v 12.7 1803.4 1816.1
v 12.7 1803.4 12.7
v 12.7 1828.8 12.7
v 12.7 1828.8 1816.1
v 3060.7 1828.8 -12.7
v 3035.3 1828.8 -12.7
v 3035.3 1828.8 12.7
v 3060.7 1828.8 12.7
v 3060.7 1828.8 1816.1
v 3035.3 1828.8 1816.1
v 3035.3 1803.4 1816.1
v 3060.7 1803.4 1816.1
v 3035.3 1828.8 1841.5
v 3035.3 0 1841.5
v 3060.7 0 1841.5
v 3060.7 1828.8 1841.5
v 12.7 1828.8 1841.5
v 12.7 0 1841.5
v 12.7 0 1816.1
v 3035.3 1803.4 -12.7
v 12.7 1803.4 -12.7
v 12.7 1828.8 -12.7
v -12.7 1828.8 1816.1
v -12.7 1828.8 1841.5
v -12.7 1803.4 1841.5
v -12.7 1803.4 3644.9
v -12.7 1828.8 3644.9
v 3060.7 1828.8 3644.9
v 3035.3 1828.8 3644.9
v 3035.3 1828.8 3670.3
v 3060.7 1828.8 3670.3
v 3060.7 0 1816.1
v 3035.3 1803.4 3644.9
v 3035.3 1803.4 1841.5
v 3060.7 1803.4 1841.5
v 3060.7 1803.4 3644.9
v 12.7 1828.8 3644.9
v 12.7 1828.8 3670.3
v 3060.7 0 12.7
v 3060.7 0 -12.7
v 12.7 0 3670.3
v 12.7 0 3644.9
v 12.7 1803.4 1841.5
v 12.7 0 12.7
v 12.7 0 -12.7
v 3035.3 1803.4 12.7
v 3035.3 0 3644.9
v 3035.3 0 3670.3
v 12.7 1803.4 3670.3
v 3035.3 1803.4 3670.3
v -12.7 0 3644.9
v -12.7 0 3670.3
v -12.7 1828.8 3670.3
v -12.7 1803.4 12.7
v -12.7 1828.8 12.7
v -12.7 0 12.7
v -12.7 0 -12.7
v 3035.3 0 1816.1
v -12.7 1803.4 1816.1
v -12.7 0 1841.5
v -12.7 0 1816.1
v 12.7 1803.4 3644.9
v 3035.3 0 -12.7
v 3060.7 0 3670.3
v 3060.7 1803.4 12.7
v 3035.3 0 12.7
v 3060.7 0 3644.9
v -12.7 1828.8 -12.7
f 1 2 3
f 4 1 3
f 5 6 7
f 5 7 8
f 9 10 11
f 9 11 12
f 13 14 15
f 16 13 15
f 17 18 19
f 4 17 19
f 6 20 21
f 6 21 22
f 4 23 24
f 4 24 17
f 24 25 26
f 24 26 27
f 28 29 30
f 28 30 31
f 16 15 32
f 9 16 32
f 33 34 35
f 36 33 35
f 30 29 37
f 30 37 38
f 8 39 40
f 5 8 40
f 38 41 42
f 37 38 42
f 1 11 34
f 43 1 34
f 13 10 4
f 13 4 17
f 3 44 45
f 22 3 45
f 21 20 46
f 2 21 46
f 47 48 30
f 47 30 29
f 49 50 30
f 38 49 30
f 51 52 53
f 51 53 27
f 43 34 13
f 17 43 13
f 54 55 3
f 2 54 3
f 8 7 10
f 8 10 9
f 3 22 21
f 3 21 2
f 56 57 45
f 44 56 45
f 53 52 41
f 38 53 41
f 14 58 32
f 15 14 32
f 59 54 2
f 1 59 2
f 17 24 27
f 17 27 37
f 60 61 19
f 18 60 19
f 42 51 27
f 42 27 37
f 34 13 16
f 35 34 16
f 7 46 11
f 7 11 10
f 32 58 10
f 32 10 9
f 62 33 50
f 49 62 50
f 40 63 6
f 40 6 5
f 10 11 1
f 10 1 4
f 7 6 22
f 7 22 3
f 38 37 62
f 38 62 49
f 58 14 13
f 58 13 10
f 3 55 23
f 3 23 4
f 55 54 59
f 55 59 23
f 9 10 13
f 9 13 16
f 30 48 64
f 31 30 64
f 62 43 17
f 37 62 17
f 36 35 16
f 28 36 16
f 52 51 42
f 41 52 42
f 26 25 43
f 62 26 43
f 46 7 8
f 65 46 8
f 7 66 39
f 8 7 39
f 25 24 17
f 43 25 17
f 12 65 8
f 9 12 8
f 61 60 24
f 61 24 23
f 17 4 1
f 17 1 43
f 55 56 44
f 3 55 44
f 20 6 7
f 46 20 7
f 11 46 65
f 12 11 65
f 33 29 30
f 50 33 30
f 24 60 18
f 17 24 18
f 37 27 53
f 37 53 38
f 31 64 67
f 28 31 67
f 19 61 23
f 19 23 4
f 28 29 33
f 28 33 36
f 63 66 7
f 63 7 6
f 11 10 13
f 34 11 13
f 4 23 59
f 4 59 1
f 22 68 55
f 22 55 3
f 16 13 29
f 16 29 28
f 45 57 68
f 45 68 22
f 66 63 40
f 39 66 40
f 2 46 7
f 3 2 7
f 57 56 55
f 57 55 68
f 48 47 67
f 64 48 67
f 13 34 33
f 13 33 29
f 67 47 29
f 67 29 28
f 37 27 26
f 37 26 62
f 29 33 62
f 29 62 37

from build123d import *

# Parameters (mm, degrees)
SKETCH1_W             = 25.4
SKETCH1_H             = 25.4
BOSS_EXTRUDE1_DEPTH   = 1828.8
BOSS_EXTRUDE1_2_DEPTH = 1828.8
BOSS_EXTRUDE1_3_DEPTH = 1828.8
BOSS_EXTRUDE1_4_DEPTH = 1828.8
BOSS_EXTRUDE1_5_DEPTH = 1828.8
BOSS_EXTRUDE1_6_DEPTH = 1828.8
SKETCH2_W             = 25.4
SKETCH2_H             = 25.4
BOSS_EXTRUDE2_DEPTH   = 1803.4
BOSS_EXTRUDE2_2_DEPTH = 1803.4
SKETCH3_W             = 25.4
SKETCH3_H             = 25.4
BOSS_EXTRUDE3_DEPTH   = 1803.4
BOSS_EXTRUDE3_2_DEPTH = 1803.4
SKETCH4_W             = 25.4
SKETCH4_H             = 25.4
BOSS_EXTRUDE4_DEPTH   = 3022.6
BOSS_EXTRUDE4_2_DEPTH = 3022.6
BOSS_EXTRUDE4_3_DEPTH = 3022.6


with BuildPart() as part:
    # Sketch1 → Boss-Extrude1 (new body)
    with BuildSketch(Plane(origin=(0, 0, 0), x_dir=(1, 0, 0), z_dir=(0, 1, 0))):
        Rectangle(SKETCH1_W, SKETCH1_H)
    extrude(amount=BOSS_EXTRUDE1_DEPTH)


with BuildPart() as body_2:
    # Sketch1 → Boss-Extrude1 2 (new body)
    with BuildSketch(Plane(origin=(0, 0, 0), x_dir=(1, 0, 0), z_dir=(0, 1, 0))):
        with Locations((3048, -1828.8)):
            Rectangle(SKETCH1_W, SKETCH1_H)
    extrude(amount=BOSS_EXTRUDE1_2_DEPTH)


with BuildPart() as body_3:
    # Sketch1 → Boss-Extrude1 3 (new body)
    with BuildSketch(Plane(origin=(0, 0, 0), x_dir=(1, 0, 0), z_dir=(0, 1, 0))):
        with Locations((0, -1828.8)):
            Rectangle(SKETCH1_W, SKETCH1_H)
    extrude(amount=BOSS_EXTRUDE1_3_DEPTH)


with BuildPart() as body_4:
    # Sketch1 → Boss-Extrude1 4 (new body)
    with BuildSketch(Plane(origin=(0, 0, 0), x_dir=(1, 0, 0), z_dir=(0, 1, 0))):
        with Locations((0, -3657.6)):
            Rectangle(SKETCH1_W, SKETCH1_H)
    extrude(amount=BOSS_EXTRUDE1_4_DEPTH)


with BuildPart() as body_5:
    # Sketch1 → Boss-Extrude1 5 (new body)
    with BuildSketch(Plane(origin=(0, 0, 0), x_dir=(1, 0, 0), z_dir=(0, 1, 0))):
        with Locations((3048, -3657.6)):
            Rectangle(SKETCH1_W, SKETCH1_H)
    extrude(amount=BOSS_EXTRUDE1_5_DEPTH)


with BuildPart() as body_6:
    # Sketch1 → Boss-Extrude1 6 (new body)
    with BuildSketch(Plane(origin=(0, 0, 0), x_dir=(1, 0, 0), z_dir=(0, 1, 0))):
        with Locations((3048, 0)):
            Rectangle(SKETCH1_W, SKETCH1_H)
    extrude(amount=BOSS_EXTRUDE1_6_DEPTH)


with BuildPart() as body_7:
    # Sketch2 → Boss-Extrude2 (new body)
    with BuildSketch(Plane.XY.offset(12.7)):
        with Locations((0, 1816.1)):
            Rectangle(SKETCH2_W, SKETCH2_H)
    extrude(amount=BOSS_EXTRUDE2_DEPTH)


with BuildPart() as body_8:
    # Sketch2 → Boss-Extrude2 2 (new body)
    with BuildSketch(Plane.XY.offset(12.7)):
        with Locations((3048, 1816.1)):
            Rectangle(SKETCH2_W, SKETCH2_H)
    extrude(amount=BOSS_EXTRUDE2_2_DEPTH)


with BuildPart() as body_9:
    # Sketch3 → Boss-Extrude3 (new body)
    with BuildSketch(Plane.XY.offset(1841.5)):
        with Locations((0, 1816.1)):
            Rectangle(SKETCH3_W, SKETCH3_H)
    extrude(amount=BOSS_EXTRUDE3_DEPTH)


with BuildPart() as body_10:
    # Sketch3 → Boss-Extrude3 2 (new body)
    with BuildSketch(Plane.XY.offset(1841.5)):
        with Locations((3048, 1816.1)):
            Rectangle(SKETCH3_W, SKETCH3_H)
    extrude(amount=BOSS_EXTRUDE3_2_DEPTH)


with BuildPart() as body_11:
    # Sketch4 → Boss-Extrude4 (new body)
    with BuildSketch(Plane.ZY.offset(-3035.3)):
        with Locations((0, 1816.1)):
            Rectangle(SKETCH4_W, SKETCH4_H)
    extrude(amount=BOSS_EXTRUDE4_DEPTH)


with BuildPart() as body_12:
    # Sketch4 → Boss-Extrude4 2 (new body)
    with BuildSketch(Plane.ZY.offset(-3035.3)):
        with Locations((1828.8, 1816.1)):
            Rectangle(SKETCH4_W, SKETCH4_H)
    extrude(amount=BOSS_EXTRUDE4_2_DEPTH)


with BuildPart() as body_13:
    # Sketch4 → Boss-Extrude4 3 (new body)
    with BuildSketch(Plane.ZY.offset(-3035.3)):
        with Locations((3657.6, 1816.1)):
            Rectangle(SKETCH4_W, SKETCH4_H)
    extrude(amount=BOSS_EXTRUDE4_3_DEPTH)


solid = Compound([part.part, body_2.part, body_3.part, body_4.part, body_5.part, body_6.part, body_7.part, body_8.part, body_9.part, body_10.part, body_11.part, body_12.part, body_13.part])
